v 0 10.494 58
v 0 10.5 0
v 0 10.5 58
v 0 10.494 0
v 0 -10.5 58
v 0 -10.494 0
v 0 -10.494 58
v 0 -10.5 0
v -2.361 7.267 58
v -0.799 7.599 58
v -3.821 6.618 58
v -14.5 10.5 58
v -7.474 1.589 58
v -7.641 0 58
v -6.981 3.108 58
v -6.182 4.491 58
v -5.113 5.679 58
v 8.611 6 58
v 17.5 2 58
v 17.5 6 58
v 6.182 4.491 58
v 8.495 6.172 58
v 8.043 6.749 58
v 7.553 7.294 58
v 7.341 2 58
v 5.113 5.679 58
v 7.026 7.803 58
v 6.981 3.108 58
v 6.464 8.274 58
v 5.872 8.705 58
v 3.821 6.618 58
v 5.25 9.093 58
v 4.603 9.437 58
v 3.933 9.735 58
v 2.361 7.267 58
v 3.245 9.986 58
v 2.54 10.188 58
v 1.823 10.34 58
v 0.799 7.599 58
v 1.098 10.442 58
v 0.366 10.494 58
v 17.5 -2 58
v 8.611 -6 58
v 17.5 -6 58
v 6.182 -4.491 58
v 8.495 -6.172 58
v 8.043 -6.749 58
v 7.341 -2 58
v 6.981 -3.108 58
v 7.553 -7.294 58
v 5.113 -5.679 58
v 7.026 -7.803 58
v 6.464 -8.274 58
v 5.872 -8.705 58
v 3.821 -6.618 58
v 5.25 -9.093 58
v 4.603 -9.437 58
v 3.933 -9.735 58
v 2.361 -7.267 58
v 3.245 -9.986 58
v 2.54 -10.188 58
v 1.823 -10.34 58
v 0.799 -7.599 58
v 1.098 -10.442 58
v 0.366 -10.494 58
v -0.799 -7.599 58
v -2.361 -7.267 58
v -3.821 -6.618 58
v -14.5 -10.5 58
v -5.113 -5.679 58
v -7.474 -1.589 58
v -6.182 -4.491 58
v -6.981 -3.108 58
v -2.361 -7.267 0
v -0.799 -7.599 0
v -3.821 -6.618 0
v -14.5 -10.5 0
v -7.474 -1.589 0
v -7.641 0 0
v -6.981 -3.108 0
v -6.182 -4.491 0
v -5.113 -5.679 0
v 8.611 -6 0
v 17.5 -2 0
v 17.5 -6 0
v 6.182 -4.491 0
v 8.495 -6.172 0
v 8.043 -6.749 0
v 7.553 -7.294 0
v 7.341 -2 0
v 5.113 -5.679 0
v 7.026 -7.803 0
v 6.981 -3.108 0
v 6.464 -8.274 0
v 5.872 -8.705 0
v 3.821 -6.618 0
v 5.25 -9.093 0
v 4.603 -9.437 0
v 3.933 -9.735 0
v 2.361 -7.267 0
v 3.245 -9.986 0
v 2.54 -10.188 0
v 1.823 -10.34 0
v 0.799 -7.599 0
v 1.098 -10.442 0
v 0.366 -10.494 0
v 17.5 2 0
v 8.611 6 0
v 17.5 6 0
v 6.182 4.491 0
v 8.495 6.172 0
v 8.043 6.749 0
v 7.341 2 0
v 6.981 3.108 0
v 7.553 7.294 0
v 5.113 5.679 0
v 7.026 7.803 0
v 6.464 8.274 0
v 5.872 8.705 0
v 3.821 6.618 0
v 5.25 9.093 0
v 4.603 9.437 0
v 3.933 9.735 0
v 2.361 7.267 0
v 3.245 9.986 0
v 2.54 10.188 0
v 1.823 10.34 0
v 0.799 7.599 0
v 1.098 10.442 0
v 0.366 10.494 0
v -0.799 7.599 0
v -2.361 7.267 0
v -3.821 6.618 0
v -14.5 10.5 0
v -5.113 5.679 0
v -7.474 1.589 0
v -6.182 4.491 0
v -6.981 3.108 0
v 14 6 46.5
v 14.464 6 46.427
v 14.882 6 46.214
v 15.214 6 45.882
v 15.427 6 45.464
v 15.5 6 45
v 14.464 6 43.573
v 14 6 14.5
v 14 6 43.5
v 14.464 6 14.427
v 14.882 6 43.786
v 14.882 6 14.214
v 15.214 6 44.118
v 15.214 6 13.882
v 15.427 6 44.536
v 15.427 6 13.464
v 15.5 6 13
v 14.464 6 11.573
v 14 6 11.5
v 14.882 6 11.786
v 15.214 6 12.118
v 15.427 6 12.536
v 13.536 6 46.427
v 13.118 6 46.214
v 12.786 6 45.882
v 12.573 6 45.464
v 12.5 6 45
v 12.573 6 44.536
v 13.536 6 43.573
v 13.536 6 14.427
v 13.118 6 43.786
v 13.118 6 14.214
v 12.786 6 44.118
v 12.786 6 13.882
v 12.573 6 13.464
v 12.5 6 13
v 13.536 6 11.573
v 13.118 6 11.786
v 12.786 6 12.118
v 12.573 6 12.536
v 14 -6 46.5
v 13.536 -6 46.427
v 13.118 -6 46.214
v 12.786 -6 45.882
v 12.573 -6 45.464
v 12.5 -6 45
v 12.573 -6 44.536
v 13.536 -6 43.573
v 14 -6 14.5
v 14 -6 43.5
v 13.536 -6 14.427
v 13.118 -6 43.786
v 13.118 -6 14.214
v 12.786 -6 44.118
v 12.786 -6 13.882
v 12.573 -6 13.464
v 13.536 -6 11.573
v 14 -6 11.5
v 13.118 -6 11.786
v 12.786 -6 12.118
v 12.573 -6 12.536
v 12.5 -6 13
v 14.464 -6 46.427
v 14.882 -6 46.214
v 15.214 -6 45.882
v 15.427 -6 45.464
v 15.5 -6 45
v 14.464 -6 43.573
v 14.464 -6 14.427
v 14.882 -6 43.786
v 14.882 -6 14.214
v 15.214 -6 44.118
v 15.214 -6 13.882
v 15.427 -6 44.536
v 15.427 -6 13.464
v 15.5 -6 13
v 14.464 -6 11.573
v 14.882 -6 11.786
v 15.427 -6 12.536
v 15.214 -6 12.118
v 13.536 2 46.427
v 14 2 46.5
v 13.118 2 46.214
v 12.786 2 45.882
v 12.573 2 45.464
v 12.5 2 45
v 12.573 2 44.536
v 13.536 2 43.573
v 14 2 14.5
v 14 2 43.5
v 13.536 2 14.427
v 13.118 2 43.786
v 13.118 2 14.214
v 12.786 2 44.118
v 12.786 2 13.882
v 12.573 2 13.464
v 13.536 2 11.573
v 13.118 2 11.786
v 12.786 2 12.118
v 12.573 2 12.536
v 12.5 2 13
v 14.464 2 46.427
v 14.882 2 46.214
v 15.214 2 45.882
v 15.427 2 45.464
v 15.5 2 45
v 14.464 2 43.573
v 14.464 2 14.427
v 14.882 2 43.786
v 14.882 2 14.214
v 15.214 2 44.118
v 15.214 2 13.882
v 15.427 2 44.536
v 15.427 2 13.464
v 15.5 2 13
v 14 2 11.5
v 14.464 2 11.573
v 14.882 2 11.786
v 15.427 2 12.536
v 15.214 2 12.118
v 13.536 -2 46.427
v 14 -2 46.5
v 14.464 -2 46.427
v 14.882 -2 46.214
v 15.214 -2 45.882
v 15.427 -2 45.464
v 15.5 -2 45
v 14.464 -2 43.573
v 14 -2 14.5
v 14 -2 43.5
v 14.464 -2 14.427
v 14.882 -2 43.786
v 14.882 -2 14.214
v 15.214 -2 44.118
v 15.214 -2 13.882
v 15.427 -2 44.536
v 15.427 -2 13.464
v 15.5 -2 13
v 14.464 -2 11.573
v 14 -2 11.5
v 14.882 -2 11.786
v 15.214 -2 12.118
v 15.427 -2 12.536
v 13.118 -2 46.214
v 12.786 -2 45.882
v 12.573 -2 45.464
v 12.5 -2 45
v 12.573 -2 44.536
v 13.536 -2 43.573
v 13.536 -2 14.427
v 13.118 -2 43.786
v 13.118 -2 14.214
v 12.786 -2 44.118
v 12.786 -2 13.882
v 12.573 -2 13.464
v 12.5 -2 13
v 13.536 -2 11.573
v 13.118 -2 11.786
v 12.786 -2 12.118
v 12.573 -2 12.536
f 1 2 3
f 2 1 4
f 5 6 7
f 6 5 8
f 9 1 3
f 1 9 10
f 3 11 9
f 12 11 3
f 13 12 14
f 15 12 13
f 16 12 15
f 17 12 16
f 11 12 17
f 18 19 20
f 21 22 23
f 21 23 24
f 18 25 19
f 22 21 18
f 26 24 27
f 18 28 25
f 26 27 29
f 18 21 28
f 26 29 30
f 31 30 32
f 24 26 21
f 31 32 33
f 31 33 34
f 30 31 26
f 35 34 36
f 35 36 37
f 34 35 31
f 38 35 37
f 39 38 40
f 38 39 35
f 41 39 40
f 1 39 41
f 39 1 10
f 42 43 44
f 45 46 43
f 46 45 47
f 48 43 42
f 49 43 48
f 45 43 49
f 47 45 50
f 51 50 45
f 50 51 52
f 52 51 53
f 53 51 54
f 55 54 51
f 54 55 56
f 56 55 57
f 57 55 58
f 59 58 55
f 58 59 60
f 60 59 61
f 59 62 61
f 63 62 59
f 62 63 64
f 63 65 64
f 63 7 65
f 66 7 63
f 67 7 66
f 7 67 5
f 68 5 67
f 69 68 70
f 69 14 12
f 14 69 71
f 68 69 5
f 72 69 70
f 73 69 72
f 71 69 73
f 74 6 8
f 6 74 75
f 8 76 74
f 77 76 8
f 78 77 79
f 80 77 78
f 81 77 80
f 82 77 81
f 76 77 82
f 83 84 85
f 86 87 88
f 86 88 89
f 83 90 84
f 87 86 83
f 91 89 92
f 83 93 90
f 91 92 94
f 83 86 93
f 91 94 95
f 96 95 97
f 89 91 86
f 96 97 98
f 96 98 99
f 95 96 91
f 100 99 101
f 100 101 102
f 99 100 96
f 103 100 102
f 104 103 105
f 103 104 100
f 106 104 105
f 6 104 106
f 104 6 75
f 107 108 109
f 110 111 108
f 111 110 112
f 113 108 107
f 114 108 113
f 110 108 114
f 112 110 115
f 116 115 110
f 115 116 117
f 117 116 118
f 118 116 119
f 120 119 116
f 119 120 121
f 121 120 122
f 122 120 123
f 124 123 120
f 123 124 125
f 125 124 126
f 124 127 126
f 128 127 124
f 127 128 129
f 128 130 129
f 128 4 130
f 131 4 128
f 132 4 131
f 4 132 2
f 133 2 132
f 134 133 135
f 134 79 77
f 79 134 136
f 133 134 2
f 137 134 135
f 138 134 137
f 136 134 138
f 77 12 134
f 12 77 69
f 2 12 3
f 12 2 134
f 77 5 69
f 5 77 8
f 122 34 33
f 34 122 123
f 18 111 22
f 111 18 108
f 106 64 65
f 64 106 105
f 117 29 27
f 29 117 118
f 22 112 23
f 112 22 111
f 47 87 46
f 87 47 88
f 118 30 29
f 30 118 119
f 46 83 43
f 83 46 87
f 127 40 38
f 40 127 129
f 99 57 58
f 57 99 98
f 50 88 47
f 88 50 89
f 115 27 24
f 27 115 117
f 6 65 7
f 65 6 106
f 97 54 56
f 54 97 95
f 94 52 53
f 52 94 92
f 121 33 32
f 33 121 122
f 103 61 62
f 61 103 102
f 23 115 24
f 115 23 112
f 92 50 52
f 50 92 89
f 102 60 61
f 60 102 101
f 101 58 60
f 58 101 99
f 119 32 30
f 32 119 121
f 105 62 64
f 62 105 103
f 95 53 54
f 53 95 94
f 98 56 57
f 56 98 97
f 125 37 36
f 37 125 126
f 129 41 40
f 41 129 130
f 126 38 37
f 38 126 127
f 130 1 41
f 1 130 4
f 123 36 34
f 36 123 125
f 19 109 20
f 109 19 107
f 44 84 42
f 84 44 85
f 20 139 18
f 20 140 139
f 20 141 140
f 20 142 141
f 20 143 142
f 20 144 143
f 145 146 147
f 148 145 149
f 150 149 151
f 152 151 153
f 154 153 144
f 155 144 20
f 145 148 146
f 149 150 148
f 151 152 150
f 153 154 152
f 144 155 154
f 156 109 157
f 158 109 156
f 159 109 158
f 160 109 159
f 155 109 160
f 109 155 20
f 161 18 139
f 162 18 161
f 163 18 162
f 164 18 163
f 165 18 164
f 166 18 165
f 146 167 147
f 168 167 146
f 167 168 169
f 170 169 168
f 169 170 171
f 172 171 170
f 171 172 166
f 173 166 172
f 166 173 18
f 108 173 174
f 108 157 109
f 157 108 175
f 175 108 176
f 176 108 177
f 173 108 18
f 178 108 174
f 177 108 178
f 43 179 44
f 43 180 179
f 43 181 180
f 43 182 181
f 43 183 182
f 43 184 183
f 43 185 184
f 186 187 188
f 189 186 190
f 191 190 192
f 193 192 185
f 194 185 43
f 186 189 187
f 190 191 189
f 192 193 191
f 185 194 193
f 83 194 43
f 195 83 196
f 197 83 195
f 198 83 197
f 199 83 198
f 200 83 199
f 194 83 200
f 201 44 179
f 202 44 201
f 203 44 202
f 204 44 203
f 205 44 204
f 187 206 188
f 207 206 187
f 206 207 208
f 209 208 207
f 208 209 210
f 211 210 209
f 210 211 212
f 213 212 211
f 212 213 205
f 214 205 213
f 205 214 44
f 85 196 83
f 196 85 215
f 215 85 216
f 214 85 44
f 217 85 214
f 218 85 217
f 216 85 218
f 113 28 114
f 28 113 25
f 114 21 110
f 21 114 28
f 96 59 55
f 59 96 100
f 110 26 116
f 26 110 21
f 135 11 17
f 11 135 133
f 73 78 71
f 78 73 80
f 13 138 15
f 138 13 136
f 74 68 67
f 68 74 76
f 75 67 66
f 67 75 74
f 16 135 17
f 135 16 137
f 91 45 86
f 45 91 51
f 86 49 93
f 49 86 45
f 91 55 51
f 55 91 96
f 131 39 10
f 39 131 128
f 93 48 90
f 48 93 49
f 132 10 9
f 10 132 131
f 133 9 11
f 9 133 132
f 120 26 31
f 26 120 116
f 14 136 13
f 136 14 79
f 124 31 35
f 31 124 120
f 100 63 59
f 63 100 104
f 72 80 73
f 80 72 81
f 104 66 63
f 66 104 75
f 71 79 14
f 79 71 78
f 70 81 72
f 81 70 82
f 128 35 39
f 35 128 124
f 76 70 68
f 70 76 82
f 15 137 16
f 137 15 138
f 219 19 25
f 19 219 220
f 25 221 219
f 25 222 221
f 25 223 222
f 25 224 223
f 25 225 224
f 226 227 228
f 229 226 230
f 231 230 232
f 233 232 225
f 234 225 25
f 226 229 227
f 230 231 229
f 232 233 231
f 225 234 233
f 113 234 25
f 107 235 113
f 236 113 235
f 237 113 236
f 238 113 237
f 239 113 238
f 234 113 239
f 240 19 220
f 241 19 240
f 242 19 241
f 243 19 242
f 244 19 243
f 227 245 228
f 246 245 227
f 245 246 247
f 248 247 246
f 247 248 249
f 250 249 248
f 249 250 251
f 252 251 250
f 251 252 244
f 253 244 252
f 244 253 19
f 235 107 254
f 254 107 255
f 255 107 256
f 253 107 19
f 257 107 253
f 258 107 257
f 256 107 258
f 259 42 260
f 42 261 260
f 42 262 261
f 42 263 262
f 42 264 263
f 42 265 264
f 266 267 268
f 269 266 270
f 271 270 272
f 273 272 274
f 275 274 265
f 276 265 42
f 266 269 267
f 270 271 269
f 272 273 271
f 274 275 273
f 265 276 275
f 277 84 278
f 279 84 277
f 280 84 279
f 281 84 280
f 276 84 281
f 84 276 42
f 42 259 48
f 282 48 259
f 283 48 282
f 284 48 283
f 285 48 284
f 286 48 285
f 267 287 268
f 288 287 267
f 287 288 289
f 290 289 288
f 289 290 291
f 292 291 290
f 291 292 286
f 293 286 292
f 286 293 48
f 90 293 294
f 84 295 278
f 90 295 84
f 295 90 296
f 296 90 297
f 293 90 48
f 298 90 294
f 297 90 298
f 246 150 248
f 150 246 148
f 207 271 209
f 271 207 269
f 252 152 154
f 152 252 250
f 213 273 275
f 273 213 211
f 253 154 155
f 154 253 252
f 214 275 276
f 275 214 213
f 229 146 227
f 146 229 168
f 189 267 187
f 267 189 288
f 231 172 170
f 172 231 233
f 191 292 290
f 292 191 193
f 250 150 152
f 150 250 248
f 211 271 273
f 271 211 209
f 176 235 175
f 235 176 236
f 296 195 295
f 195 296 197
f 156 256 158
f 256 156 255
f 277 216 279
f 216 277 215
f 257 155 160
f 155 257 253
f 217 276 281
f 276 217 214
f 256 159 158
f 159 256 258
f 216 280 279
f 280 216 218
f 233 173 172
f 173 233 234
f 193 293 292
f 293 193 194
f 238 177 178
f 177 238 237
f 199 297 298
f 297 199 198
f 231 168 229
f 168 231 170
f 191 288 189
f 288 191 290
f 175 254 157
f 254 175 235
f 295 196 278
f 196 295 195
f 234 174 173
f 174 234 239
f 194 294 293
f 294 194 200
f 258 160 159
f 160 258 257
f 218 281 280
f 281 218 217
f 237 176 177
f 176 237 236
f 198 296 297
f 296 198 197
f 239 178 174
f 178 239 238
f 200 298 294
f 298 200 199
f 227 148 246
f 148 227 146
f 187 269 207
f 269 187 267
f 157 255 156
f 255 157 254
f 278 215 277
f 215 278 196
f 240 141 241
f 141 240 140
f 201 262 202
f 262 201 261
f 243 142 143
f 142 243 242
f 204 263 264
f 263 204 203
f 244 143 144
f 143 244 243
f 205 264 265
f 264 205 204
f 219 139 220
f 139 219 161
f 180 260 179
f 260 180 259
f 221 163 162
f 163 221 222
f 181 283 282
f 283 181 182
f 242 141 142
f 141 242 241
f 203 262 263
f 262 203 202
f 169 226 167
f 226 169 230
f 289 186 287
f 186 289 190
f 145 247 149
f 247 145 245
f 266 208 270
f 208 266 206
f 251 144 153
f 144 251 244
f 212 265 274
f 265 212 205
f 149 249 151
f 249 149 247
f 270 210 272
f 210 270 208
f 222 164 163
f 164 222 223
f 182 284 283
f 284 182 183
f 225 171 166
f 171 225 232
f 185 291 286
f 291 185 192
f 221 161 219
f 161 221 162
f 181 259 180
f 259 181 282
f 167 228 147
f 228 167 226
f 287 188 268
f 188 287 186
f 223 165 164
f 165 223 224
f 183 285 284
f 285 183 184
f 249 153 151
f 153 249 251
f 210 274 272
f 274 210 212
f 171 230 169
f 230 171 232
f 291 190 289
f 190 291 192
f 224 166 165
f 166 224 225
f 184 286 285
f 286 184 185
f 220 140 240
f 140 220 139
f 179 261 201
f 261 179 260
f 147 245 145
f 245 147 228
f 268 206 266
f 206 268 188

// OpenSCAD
// file: polyholes.scad
//
// Mendel90
//
// GNU GPL v2
// nop.head@gmail.com
// hydraraptor.blogspot.com
//
// See http://hydraraptor.blogspot.com/2011/02/polyholes.html
//
function sides(r)=max(round(4 *r),3);
function correctedRadius(r,n)=0.1 + r / cos(180 / n);
function correctedDiameter(d)=0.2 + d / cos(180 / sides(d / 2));

module polyCircle(r, center=false) {
    n=sides(r);
    circle(r=correctedRadius(r,n), $fn=n, center=center);
}

module poly_circle(r, center=false) {
	polyCircle(r, center);
}

module polyCylinder(r, h, center=false) {
    n=sides(r);
    cylinder(h=h, r=correctedRadius(r,n), $fn=n, center=center);
}

module poly_cylinder(r, h, center=false) {
	polyCylinder(r,h,center);
}

module polydCylinder(r, center=false) {
    n=sides(r);
    r=correctedRadius(r,n);
    cylinder(h=h, r=r, $fn=n, center=center);
    translate([0, -r, 0])
        cube([r, 2 * r, h]);
}

module poly_d_cylinder(r, center=false) {
	polydCylinder(r,center);
}
// main file
// PRUSA iteration3
// Bearing holders
// GNU GPL v3
// Josef Průša <iam@josefprusa.cz> and contributors
// http://www.reprap.org/wiki/Prusa_Mendel
// http://prusamendel.org

use <polyholes.scad>

bearing_diameter = 15;

module horizontal_bearing_base(bearings=1){
 translate(v=[0,0,6]) cube(size = [24,8+bearings*25,12], center = true);	
}
module horizontal_bearing_holes(bearings=1){
 cutter_lenght = 10+bearings*25;
 one_holder_lenght = 8+25;
 holder_lenght = 8+bearings*25;
 
 // Main bearing cut
 difference(){
  translate(v=[0,0,12]) rotate(a=[90,0,0]) translate(v=[0,0,-cutter_lenght/2]) cylinder(h = cutter_lenght, r=bearing_diameter/2, $fn=50);
  // Bearing retainers
  translate(v=[0,1-holder_lenght/2,3]) cube(size = [24,6,8], center = true);
  translate(v=[0,-1+holder_lenght/2,3]) cube(size = [24,6,8], center = true);
 }
 
 // Ziptie cutouts
 ziptie_cut_ofset = 0;
 for ( i = [0 : bearings-1] ){
  // For easier positioning I move them by half of one 
  // bearing holder then add each bearign lenght and then center again
  translate(v=[0,-holder_lenght/2,0]) translate(v=[0,one_holder_lenght/2+i*25,0]) difference(){
   union(){
    translate(v=[0,2-6,12]) rotate(a=[90,0,0]) translate(v=[0,0,0]) cylinder(h = 4, r=12.5, $fn=50);
    translate(v=[0,2+6,12]) rotate(a=[90,0,0]) translate(v=[0,0,0]) cylinder(h = 4, r=12.5, $fn=50);
   }
   translate(v=[0,10,12]) rotate(a=[90,0,0]) translate(v=[0,0,0]) cylinder(h = 24, r=10, $fn=50);
  }
 }
 
}

module horizontal_bearing_test(){
 difference(){
  horizontal_bearing_base(1);
  horizontal_bearing_holes(1);
 }
 translate(v=[30,0,0]) difference(){
  horizontal_bearing_base(2);
  horizontal_bearing_holes(2);
 }
 translate(v=[60,0,0]) difference(){
  horizontal_bearing_base(3);
  horizontal_bearing_holes(3);
 }
}



thinwall = 3;
bearing_size = bearing_diameter + 2 * thinwall;

module vertical_bearing_base(){
 translate(v=[-2-bearing_size/4,0,29]) cube(size = [4+bearing_size/2,bearing_size,58], center = true);
 cylinder(h = 58, r=bearing_size/2, $fn = 90);
 translate(v=[(bearing_size/2)+2,0,29]) cube([10,12,58], center=true);
}

module vertical_bearing_holes(){
  height = 58;
  translate(v=[0,0,-1]) poly_cylinder(h = height+2, r=bearing_diameter/2);
  // translate(v=[0,0,24]) poly_cylinder(h = height-(24*2), r=bearing_diameter/2);
  translate(v=[bearing_diameter/2-1,-4/2,-1]) cube(size = [(thinwall*2)+8,4,62]);
  rotate([90,0,0]) translate([14,13,0]) cylinder(d=3, h=15, center=true, $fn = 20);
  rotate([90,0,0]) translate([14,height-13,0]) cylinder(d=3, h=15, center=true, $fn = 20);
}

difference(){
  vertical_bearing_base();
  vertical_bearing_holes();
}
